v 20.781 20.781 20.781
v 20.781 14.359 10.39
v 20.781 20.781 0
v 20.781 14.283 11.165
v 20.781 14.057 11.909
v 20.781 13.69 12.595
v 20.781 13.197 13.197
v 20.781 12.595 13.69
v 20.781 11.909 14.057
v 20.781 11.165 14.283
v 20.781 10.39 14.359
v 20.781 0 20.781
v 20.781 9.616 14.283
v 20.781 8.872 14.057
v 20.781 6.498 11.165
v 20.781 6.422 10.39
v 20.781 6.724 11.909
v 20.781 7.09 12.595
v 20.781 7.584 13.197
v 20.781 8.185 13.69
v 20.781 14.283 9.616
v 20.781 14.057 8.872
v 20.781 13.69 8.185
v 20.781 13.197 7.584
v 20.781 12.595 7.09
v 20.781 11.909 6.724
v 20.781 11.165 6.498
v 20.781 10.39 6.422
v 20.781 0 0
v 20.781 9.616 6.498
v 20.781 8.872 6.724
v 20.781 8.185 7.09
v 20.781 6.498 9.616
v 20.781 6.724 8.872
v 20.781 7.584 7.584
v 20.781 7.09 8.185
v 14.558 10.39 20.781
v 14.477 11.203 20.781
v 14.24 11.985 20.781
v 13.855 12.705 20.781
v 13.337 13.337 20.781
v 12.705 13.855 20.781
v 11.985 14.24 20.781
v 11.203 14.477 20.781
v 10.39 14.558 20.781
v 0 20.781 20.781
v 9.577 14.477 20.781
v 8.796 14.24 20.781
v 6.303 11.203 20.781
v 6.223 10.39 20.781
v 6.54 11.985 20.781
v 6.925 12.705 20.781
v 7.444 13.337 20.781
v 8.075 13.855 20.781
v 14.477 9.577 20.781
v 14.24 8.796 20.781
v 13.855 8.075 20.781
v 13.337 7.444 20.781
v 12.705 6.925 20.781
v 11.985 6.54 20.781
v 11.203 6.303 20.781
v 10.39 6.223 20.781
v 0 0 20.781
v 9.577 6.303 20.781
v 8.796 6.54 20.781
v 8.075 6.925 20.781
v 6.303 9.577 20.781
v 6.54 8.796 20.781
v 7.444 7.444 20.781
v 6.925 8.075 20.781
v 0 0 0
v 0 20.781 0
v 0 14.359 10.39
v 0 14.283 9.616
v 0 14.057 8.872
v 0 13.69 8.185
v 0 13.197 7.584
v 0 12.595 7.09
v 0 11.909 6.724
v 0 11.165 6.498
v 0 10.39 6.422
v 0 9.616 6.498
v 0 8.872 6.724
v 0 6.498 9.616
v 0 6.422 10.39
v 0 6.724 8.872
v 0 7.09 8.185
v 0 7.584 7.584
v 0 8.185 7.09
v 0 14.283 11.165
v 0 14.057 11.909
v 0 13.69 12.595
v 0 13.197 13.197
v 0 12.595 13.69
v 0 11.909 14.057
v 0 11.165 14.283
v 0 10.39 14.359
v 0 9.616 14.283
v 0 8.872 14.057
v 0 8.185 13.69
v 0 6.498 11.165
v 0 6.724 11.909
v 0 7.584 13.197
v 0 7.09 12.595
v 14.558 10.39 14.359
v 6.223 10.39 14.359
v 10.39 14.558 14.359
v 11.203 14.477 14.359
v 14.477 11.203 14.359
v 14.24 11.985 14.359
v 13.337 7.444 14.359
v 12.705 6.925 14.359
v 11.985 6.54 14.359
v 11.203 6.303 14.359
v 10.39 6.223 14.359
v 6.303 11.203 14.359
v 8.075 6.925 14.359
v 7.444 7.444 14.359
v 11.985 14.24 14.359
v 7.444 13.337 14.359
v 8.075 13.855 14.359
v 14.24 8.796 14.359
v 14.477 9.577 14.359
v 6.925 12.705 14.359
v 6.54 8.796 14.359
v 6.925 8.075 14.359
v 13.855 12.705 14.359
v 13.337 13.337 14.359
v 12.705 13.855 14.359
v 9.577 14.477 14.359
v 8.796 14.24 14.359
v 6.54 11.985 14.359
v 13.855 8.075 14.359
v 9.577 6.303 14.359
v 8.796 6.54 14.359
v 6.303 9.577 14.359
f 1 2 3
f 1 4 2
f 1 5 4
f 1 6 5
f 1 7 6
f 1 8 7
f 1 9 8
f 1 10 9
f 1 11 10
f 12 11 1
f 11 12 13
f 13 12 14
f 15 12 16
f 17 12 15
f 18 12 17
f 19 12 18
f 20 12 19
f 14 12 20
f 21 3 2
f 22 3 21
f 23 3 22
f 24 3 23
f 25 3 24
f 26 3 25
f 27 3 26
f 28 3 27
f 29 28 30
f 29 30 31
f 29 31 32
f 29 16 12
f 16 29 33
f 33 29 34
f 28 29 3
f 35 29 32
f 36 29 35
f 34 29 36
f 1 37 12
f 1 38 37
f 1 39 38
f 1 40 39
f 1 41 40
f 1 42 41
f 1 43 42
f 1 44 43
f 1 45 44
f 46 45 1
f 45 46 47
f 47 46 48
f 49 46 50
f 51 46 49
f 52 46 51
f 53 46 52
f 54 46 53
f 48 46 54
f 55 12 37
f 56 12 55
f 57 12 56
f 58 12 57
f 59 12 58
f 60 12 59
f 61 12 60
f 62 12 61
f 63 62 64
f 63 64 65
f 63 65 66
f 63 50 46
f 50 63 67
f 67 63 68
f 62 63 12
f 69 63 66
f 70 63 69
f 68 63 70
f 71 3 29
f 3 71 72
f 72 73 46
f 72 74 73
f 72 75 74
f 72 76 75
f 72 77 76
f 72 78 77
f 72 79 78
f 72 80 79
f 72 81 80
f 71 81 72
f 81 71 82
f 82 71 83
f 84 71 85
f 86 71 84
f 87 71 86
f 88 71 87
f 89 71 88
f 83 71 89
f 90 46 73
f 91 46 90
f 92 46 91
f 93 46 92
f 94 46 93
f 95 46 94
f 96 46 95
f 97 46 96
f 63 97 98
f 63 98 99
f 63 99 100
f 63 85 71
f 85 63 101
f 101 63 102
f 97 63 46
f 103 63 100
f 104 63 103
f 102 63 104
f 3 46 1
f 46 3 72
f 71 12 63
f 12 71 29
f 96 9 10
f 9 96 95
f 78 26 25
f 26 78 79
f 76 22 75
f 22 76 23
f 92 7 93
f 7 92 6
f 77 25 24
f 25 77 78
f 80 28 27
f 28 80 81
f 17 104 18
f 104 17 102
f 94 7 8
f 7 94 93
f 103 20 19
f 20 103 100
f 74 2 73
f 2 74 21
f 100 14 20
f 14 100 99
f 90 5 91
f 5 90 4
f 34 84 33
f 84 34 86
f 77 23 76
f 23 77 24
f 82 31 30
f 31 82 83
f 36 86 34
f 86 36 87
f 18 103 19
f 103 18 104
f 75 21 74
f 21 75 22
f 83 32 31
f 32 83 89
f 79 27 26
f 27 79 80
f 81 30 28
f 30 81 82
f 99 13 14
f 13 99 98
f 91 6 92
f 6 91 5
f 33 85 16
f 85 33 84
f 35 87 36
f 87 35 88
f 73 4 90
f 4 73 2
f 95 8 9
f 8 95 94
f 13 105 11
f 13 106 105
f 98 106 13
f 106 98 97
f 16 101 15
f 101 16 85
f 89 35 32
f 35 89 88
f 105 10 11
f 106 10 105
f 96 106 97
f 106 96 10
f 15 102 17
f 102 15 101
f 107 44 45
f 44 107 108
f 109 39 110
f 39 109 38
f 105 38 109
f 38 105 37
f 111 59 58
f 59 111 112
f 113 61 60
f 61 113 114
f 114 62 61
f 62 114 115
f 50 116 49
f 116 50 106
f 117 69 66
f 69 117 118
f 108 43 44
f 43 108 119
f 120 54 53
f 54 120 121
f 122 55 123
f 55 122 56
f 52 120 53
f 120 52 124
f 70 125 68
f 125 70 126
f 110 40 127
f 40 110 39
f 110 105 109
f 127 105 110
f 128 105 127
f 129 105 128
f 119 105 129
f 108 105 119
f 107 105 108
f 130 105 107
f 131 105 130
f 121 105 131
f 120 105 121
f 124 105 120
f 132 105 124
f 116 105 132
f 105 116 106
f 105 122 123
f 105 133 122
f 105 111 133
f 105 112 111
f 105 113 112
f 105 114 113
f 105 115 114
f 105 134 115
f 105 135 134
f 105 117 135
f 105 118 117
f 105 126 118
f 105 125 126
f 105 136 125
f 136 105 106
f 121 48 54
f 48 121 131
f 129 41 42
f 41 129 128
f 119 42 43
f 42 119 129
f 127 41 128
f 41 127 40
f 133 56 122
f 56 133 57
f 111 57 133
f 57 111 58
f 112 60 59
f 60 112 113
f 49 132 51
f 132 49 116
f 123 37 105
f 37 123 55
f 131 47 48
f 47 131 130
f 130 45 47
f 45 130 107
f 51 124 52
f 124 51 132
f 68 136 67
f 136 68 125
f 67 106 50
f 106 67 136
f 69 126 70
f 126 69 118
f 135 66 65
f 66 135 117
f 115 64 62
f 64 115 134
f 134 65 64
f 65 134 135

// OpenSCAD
// A default set of sizes 
goldenratio = 1.61803399;
joinfactor = 0.25;

IR = 5/16/2*25.4; // Inner radius of connector
OR = (IR * goldenratio)*goldenratio; // Outer radius of connector
Length = OR*2; // Length of connector

quarterinch = 1/4 * 25.4; 
eighthinch = 1/8 * 25.4;

//OuterSquareInnerCylinder(22, IR, OR);
//cubevertexround(Radius, Length, IR, OR, Depth);
//cubevertexsquare(Length, IR, OR, Depth);
//cubevertexsquarestack(Length, IR, OR, Depth);
//cubevertexsquarestackthru(Length, IR, OR, Depth);
//cubevertexsquarethru(Length, IR, OR, Depth);
//elbowriser(Length, IR, OR);
smoothbarholder(Length, OR*2, IR, IR*1.05, $fn=32);

module OuterSquareInnerCylinder(Length, IR, OR) 
{
	OuterSize = OR*2;

	difference()
	{
		cube(size=[OuterSize, OuterSize, Length]);
		
		translate([OR, OR, -joinfactor])
		cylinder(r=IR, h=Length+joinfactor*2);
	}
}

module elbowriser(Length, IR, OR)
{
	Offset = 0;
	OuterSize = OR*2;
	RDiff = OR - IR;

	difference()
	{
		union()
		{
			for(c=[
				[Length, OuterSize, OuterSize],	// Along x-axis
				[OuterSize, Length, OuterSize],	// Along y-axis
				[OuterSize, OuterSize, Length]		// Along z-axis
				])
			{
				cube(size=c);
			}
		}

		// Subtract out the holes
		rotate([0, 90, 0])
		translate([-OR, OR,-joinfactor])
		cylinder(r=IR, h=Length+joinfactor*2);

		rotate([-90, 0, 0])
		translate([OR, -OR,-joinfactor])
		cylinder(r=IR, h=Length+joinfactor*2);

		translate([OR, OR,-joinfactor])
		cylinder(r=IR, h=Length+joinfactor*2);

		// Do some carving on the edges for better raft separation and aesthetics
//		rotate([0, 90, 0])
//		translate([IR*1/goldenratio, OR,-joinfactor])
//		cylinder(r=IR*goldenratio, h=Length+joinfactor*2);
	}
	
}

module smoothbarholder(Width, Depth, rodRadius, barRadius)
{

	difference()
	{
		cube(size=[Width, Depth, Depth]);
	
		rotate([0, 90, 0])
		translate([-Depth/2, Depth/2,-joinfactor])
		cylinder(r=rodRadius, h=Length+joinfactor*2);

		translate([Width/2, Depth/2,Depth-rodRadius*goldenratio])
		cylinder(r=barRadius, h=Length);
	}
}
